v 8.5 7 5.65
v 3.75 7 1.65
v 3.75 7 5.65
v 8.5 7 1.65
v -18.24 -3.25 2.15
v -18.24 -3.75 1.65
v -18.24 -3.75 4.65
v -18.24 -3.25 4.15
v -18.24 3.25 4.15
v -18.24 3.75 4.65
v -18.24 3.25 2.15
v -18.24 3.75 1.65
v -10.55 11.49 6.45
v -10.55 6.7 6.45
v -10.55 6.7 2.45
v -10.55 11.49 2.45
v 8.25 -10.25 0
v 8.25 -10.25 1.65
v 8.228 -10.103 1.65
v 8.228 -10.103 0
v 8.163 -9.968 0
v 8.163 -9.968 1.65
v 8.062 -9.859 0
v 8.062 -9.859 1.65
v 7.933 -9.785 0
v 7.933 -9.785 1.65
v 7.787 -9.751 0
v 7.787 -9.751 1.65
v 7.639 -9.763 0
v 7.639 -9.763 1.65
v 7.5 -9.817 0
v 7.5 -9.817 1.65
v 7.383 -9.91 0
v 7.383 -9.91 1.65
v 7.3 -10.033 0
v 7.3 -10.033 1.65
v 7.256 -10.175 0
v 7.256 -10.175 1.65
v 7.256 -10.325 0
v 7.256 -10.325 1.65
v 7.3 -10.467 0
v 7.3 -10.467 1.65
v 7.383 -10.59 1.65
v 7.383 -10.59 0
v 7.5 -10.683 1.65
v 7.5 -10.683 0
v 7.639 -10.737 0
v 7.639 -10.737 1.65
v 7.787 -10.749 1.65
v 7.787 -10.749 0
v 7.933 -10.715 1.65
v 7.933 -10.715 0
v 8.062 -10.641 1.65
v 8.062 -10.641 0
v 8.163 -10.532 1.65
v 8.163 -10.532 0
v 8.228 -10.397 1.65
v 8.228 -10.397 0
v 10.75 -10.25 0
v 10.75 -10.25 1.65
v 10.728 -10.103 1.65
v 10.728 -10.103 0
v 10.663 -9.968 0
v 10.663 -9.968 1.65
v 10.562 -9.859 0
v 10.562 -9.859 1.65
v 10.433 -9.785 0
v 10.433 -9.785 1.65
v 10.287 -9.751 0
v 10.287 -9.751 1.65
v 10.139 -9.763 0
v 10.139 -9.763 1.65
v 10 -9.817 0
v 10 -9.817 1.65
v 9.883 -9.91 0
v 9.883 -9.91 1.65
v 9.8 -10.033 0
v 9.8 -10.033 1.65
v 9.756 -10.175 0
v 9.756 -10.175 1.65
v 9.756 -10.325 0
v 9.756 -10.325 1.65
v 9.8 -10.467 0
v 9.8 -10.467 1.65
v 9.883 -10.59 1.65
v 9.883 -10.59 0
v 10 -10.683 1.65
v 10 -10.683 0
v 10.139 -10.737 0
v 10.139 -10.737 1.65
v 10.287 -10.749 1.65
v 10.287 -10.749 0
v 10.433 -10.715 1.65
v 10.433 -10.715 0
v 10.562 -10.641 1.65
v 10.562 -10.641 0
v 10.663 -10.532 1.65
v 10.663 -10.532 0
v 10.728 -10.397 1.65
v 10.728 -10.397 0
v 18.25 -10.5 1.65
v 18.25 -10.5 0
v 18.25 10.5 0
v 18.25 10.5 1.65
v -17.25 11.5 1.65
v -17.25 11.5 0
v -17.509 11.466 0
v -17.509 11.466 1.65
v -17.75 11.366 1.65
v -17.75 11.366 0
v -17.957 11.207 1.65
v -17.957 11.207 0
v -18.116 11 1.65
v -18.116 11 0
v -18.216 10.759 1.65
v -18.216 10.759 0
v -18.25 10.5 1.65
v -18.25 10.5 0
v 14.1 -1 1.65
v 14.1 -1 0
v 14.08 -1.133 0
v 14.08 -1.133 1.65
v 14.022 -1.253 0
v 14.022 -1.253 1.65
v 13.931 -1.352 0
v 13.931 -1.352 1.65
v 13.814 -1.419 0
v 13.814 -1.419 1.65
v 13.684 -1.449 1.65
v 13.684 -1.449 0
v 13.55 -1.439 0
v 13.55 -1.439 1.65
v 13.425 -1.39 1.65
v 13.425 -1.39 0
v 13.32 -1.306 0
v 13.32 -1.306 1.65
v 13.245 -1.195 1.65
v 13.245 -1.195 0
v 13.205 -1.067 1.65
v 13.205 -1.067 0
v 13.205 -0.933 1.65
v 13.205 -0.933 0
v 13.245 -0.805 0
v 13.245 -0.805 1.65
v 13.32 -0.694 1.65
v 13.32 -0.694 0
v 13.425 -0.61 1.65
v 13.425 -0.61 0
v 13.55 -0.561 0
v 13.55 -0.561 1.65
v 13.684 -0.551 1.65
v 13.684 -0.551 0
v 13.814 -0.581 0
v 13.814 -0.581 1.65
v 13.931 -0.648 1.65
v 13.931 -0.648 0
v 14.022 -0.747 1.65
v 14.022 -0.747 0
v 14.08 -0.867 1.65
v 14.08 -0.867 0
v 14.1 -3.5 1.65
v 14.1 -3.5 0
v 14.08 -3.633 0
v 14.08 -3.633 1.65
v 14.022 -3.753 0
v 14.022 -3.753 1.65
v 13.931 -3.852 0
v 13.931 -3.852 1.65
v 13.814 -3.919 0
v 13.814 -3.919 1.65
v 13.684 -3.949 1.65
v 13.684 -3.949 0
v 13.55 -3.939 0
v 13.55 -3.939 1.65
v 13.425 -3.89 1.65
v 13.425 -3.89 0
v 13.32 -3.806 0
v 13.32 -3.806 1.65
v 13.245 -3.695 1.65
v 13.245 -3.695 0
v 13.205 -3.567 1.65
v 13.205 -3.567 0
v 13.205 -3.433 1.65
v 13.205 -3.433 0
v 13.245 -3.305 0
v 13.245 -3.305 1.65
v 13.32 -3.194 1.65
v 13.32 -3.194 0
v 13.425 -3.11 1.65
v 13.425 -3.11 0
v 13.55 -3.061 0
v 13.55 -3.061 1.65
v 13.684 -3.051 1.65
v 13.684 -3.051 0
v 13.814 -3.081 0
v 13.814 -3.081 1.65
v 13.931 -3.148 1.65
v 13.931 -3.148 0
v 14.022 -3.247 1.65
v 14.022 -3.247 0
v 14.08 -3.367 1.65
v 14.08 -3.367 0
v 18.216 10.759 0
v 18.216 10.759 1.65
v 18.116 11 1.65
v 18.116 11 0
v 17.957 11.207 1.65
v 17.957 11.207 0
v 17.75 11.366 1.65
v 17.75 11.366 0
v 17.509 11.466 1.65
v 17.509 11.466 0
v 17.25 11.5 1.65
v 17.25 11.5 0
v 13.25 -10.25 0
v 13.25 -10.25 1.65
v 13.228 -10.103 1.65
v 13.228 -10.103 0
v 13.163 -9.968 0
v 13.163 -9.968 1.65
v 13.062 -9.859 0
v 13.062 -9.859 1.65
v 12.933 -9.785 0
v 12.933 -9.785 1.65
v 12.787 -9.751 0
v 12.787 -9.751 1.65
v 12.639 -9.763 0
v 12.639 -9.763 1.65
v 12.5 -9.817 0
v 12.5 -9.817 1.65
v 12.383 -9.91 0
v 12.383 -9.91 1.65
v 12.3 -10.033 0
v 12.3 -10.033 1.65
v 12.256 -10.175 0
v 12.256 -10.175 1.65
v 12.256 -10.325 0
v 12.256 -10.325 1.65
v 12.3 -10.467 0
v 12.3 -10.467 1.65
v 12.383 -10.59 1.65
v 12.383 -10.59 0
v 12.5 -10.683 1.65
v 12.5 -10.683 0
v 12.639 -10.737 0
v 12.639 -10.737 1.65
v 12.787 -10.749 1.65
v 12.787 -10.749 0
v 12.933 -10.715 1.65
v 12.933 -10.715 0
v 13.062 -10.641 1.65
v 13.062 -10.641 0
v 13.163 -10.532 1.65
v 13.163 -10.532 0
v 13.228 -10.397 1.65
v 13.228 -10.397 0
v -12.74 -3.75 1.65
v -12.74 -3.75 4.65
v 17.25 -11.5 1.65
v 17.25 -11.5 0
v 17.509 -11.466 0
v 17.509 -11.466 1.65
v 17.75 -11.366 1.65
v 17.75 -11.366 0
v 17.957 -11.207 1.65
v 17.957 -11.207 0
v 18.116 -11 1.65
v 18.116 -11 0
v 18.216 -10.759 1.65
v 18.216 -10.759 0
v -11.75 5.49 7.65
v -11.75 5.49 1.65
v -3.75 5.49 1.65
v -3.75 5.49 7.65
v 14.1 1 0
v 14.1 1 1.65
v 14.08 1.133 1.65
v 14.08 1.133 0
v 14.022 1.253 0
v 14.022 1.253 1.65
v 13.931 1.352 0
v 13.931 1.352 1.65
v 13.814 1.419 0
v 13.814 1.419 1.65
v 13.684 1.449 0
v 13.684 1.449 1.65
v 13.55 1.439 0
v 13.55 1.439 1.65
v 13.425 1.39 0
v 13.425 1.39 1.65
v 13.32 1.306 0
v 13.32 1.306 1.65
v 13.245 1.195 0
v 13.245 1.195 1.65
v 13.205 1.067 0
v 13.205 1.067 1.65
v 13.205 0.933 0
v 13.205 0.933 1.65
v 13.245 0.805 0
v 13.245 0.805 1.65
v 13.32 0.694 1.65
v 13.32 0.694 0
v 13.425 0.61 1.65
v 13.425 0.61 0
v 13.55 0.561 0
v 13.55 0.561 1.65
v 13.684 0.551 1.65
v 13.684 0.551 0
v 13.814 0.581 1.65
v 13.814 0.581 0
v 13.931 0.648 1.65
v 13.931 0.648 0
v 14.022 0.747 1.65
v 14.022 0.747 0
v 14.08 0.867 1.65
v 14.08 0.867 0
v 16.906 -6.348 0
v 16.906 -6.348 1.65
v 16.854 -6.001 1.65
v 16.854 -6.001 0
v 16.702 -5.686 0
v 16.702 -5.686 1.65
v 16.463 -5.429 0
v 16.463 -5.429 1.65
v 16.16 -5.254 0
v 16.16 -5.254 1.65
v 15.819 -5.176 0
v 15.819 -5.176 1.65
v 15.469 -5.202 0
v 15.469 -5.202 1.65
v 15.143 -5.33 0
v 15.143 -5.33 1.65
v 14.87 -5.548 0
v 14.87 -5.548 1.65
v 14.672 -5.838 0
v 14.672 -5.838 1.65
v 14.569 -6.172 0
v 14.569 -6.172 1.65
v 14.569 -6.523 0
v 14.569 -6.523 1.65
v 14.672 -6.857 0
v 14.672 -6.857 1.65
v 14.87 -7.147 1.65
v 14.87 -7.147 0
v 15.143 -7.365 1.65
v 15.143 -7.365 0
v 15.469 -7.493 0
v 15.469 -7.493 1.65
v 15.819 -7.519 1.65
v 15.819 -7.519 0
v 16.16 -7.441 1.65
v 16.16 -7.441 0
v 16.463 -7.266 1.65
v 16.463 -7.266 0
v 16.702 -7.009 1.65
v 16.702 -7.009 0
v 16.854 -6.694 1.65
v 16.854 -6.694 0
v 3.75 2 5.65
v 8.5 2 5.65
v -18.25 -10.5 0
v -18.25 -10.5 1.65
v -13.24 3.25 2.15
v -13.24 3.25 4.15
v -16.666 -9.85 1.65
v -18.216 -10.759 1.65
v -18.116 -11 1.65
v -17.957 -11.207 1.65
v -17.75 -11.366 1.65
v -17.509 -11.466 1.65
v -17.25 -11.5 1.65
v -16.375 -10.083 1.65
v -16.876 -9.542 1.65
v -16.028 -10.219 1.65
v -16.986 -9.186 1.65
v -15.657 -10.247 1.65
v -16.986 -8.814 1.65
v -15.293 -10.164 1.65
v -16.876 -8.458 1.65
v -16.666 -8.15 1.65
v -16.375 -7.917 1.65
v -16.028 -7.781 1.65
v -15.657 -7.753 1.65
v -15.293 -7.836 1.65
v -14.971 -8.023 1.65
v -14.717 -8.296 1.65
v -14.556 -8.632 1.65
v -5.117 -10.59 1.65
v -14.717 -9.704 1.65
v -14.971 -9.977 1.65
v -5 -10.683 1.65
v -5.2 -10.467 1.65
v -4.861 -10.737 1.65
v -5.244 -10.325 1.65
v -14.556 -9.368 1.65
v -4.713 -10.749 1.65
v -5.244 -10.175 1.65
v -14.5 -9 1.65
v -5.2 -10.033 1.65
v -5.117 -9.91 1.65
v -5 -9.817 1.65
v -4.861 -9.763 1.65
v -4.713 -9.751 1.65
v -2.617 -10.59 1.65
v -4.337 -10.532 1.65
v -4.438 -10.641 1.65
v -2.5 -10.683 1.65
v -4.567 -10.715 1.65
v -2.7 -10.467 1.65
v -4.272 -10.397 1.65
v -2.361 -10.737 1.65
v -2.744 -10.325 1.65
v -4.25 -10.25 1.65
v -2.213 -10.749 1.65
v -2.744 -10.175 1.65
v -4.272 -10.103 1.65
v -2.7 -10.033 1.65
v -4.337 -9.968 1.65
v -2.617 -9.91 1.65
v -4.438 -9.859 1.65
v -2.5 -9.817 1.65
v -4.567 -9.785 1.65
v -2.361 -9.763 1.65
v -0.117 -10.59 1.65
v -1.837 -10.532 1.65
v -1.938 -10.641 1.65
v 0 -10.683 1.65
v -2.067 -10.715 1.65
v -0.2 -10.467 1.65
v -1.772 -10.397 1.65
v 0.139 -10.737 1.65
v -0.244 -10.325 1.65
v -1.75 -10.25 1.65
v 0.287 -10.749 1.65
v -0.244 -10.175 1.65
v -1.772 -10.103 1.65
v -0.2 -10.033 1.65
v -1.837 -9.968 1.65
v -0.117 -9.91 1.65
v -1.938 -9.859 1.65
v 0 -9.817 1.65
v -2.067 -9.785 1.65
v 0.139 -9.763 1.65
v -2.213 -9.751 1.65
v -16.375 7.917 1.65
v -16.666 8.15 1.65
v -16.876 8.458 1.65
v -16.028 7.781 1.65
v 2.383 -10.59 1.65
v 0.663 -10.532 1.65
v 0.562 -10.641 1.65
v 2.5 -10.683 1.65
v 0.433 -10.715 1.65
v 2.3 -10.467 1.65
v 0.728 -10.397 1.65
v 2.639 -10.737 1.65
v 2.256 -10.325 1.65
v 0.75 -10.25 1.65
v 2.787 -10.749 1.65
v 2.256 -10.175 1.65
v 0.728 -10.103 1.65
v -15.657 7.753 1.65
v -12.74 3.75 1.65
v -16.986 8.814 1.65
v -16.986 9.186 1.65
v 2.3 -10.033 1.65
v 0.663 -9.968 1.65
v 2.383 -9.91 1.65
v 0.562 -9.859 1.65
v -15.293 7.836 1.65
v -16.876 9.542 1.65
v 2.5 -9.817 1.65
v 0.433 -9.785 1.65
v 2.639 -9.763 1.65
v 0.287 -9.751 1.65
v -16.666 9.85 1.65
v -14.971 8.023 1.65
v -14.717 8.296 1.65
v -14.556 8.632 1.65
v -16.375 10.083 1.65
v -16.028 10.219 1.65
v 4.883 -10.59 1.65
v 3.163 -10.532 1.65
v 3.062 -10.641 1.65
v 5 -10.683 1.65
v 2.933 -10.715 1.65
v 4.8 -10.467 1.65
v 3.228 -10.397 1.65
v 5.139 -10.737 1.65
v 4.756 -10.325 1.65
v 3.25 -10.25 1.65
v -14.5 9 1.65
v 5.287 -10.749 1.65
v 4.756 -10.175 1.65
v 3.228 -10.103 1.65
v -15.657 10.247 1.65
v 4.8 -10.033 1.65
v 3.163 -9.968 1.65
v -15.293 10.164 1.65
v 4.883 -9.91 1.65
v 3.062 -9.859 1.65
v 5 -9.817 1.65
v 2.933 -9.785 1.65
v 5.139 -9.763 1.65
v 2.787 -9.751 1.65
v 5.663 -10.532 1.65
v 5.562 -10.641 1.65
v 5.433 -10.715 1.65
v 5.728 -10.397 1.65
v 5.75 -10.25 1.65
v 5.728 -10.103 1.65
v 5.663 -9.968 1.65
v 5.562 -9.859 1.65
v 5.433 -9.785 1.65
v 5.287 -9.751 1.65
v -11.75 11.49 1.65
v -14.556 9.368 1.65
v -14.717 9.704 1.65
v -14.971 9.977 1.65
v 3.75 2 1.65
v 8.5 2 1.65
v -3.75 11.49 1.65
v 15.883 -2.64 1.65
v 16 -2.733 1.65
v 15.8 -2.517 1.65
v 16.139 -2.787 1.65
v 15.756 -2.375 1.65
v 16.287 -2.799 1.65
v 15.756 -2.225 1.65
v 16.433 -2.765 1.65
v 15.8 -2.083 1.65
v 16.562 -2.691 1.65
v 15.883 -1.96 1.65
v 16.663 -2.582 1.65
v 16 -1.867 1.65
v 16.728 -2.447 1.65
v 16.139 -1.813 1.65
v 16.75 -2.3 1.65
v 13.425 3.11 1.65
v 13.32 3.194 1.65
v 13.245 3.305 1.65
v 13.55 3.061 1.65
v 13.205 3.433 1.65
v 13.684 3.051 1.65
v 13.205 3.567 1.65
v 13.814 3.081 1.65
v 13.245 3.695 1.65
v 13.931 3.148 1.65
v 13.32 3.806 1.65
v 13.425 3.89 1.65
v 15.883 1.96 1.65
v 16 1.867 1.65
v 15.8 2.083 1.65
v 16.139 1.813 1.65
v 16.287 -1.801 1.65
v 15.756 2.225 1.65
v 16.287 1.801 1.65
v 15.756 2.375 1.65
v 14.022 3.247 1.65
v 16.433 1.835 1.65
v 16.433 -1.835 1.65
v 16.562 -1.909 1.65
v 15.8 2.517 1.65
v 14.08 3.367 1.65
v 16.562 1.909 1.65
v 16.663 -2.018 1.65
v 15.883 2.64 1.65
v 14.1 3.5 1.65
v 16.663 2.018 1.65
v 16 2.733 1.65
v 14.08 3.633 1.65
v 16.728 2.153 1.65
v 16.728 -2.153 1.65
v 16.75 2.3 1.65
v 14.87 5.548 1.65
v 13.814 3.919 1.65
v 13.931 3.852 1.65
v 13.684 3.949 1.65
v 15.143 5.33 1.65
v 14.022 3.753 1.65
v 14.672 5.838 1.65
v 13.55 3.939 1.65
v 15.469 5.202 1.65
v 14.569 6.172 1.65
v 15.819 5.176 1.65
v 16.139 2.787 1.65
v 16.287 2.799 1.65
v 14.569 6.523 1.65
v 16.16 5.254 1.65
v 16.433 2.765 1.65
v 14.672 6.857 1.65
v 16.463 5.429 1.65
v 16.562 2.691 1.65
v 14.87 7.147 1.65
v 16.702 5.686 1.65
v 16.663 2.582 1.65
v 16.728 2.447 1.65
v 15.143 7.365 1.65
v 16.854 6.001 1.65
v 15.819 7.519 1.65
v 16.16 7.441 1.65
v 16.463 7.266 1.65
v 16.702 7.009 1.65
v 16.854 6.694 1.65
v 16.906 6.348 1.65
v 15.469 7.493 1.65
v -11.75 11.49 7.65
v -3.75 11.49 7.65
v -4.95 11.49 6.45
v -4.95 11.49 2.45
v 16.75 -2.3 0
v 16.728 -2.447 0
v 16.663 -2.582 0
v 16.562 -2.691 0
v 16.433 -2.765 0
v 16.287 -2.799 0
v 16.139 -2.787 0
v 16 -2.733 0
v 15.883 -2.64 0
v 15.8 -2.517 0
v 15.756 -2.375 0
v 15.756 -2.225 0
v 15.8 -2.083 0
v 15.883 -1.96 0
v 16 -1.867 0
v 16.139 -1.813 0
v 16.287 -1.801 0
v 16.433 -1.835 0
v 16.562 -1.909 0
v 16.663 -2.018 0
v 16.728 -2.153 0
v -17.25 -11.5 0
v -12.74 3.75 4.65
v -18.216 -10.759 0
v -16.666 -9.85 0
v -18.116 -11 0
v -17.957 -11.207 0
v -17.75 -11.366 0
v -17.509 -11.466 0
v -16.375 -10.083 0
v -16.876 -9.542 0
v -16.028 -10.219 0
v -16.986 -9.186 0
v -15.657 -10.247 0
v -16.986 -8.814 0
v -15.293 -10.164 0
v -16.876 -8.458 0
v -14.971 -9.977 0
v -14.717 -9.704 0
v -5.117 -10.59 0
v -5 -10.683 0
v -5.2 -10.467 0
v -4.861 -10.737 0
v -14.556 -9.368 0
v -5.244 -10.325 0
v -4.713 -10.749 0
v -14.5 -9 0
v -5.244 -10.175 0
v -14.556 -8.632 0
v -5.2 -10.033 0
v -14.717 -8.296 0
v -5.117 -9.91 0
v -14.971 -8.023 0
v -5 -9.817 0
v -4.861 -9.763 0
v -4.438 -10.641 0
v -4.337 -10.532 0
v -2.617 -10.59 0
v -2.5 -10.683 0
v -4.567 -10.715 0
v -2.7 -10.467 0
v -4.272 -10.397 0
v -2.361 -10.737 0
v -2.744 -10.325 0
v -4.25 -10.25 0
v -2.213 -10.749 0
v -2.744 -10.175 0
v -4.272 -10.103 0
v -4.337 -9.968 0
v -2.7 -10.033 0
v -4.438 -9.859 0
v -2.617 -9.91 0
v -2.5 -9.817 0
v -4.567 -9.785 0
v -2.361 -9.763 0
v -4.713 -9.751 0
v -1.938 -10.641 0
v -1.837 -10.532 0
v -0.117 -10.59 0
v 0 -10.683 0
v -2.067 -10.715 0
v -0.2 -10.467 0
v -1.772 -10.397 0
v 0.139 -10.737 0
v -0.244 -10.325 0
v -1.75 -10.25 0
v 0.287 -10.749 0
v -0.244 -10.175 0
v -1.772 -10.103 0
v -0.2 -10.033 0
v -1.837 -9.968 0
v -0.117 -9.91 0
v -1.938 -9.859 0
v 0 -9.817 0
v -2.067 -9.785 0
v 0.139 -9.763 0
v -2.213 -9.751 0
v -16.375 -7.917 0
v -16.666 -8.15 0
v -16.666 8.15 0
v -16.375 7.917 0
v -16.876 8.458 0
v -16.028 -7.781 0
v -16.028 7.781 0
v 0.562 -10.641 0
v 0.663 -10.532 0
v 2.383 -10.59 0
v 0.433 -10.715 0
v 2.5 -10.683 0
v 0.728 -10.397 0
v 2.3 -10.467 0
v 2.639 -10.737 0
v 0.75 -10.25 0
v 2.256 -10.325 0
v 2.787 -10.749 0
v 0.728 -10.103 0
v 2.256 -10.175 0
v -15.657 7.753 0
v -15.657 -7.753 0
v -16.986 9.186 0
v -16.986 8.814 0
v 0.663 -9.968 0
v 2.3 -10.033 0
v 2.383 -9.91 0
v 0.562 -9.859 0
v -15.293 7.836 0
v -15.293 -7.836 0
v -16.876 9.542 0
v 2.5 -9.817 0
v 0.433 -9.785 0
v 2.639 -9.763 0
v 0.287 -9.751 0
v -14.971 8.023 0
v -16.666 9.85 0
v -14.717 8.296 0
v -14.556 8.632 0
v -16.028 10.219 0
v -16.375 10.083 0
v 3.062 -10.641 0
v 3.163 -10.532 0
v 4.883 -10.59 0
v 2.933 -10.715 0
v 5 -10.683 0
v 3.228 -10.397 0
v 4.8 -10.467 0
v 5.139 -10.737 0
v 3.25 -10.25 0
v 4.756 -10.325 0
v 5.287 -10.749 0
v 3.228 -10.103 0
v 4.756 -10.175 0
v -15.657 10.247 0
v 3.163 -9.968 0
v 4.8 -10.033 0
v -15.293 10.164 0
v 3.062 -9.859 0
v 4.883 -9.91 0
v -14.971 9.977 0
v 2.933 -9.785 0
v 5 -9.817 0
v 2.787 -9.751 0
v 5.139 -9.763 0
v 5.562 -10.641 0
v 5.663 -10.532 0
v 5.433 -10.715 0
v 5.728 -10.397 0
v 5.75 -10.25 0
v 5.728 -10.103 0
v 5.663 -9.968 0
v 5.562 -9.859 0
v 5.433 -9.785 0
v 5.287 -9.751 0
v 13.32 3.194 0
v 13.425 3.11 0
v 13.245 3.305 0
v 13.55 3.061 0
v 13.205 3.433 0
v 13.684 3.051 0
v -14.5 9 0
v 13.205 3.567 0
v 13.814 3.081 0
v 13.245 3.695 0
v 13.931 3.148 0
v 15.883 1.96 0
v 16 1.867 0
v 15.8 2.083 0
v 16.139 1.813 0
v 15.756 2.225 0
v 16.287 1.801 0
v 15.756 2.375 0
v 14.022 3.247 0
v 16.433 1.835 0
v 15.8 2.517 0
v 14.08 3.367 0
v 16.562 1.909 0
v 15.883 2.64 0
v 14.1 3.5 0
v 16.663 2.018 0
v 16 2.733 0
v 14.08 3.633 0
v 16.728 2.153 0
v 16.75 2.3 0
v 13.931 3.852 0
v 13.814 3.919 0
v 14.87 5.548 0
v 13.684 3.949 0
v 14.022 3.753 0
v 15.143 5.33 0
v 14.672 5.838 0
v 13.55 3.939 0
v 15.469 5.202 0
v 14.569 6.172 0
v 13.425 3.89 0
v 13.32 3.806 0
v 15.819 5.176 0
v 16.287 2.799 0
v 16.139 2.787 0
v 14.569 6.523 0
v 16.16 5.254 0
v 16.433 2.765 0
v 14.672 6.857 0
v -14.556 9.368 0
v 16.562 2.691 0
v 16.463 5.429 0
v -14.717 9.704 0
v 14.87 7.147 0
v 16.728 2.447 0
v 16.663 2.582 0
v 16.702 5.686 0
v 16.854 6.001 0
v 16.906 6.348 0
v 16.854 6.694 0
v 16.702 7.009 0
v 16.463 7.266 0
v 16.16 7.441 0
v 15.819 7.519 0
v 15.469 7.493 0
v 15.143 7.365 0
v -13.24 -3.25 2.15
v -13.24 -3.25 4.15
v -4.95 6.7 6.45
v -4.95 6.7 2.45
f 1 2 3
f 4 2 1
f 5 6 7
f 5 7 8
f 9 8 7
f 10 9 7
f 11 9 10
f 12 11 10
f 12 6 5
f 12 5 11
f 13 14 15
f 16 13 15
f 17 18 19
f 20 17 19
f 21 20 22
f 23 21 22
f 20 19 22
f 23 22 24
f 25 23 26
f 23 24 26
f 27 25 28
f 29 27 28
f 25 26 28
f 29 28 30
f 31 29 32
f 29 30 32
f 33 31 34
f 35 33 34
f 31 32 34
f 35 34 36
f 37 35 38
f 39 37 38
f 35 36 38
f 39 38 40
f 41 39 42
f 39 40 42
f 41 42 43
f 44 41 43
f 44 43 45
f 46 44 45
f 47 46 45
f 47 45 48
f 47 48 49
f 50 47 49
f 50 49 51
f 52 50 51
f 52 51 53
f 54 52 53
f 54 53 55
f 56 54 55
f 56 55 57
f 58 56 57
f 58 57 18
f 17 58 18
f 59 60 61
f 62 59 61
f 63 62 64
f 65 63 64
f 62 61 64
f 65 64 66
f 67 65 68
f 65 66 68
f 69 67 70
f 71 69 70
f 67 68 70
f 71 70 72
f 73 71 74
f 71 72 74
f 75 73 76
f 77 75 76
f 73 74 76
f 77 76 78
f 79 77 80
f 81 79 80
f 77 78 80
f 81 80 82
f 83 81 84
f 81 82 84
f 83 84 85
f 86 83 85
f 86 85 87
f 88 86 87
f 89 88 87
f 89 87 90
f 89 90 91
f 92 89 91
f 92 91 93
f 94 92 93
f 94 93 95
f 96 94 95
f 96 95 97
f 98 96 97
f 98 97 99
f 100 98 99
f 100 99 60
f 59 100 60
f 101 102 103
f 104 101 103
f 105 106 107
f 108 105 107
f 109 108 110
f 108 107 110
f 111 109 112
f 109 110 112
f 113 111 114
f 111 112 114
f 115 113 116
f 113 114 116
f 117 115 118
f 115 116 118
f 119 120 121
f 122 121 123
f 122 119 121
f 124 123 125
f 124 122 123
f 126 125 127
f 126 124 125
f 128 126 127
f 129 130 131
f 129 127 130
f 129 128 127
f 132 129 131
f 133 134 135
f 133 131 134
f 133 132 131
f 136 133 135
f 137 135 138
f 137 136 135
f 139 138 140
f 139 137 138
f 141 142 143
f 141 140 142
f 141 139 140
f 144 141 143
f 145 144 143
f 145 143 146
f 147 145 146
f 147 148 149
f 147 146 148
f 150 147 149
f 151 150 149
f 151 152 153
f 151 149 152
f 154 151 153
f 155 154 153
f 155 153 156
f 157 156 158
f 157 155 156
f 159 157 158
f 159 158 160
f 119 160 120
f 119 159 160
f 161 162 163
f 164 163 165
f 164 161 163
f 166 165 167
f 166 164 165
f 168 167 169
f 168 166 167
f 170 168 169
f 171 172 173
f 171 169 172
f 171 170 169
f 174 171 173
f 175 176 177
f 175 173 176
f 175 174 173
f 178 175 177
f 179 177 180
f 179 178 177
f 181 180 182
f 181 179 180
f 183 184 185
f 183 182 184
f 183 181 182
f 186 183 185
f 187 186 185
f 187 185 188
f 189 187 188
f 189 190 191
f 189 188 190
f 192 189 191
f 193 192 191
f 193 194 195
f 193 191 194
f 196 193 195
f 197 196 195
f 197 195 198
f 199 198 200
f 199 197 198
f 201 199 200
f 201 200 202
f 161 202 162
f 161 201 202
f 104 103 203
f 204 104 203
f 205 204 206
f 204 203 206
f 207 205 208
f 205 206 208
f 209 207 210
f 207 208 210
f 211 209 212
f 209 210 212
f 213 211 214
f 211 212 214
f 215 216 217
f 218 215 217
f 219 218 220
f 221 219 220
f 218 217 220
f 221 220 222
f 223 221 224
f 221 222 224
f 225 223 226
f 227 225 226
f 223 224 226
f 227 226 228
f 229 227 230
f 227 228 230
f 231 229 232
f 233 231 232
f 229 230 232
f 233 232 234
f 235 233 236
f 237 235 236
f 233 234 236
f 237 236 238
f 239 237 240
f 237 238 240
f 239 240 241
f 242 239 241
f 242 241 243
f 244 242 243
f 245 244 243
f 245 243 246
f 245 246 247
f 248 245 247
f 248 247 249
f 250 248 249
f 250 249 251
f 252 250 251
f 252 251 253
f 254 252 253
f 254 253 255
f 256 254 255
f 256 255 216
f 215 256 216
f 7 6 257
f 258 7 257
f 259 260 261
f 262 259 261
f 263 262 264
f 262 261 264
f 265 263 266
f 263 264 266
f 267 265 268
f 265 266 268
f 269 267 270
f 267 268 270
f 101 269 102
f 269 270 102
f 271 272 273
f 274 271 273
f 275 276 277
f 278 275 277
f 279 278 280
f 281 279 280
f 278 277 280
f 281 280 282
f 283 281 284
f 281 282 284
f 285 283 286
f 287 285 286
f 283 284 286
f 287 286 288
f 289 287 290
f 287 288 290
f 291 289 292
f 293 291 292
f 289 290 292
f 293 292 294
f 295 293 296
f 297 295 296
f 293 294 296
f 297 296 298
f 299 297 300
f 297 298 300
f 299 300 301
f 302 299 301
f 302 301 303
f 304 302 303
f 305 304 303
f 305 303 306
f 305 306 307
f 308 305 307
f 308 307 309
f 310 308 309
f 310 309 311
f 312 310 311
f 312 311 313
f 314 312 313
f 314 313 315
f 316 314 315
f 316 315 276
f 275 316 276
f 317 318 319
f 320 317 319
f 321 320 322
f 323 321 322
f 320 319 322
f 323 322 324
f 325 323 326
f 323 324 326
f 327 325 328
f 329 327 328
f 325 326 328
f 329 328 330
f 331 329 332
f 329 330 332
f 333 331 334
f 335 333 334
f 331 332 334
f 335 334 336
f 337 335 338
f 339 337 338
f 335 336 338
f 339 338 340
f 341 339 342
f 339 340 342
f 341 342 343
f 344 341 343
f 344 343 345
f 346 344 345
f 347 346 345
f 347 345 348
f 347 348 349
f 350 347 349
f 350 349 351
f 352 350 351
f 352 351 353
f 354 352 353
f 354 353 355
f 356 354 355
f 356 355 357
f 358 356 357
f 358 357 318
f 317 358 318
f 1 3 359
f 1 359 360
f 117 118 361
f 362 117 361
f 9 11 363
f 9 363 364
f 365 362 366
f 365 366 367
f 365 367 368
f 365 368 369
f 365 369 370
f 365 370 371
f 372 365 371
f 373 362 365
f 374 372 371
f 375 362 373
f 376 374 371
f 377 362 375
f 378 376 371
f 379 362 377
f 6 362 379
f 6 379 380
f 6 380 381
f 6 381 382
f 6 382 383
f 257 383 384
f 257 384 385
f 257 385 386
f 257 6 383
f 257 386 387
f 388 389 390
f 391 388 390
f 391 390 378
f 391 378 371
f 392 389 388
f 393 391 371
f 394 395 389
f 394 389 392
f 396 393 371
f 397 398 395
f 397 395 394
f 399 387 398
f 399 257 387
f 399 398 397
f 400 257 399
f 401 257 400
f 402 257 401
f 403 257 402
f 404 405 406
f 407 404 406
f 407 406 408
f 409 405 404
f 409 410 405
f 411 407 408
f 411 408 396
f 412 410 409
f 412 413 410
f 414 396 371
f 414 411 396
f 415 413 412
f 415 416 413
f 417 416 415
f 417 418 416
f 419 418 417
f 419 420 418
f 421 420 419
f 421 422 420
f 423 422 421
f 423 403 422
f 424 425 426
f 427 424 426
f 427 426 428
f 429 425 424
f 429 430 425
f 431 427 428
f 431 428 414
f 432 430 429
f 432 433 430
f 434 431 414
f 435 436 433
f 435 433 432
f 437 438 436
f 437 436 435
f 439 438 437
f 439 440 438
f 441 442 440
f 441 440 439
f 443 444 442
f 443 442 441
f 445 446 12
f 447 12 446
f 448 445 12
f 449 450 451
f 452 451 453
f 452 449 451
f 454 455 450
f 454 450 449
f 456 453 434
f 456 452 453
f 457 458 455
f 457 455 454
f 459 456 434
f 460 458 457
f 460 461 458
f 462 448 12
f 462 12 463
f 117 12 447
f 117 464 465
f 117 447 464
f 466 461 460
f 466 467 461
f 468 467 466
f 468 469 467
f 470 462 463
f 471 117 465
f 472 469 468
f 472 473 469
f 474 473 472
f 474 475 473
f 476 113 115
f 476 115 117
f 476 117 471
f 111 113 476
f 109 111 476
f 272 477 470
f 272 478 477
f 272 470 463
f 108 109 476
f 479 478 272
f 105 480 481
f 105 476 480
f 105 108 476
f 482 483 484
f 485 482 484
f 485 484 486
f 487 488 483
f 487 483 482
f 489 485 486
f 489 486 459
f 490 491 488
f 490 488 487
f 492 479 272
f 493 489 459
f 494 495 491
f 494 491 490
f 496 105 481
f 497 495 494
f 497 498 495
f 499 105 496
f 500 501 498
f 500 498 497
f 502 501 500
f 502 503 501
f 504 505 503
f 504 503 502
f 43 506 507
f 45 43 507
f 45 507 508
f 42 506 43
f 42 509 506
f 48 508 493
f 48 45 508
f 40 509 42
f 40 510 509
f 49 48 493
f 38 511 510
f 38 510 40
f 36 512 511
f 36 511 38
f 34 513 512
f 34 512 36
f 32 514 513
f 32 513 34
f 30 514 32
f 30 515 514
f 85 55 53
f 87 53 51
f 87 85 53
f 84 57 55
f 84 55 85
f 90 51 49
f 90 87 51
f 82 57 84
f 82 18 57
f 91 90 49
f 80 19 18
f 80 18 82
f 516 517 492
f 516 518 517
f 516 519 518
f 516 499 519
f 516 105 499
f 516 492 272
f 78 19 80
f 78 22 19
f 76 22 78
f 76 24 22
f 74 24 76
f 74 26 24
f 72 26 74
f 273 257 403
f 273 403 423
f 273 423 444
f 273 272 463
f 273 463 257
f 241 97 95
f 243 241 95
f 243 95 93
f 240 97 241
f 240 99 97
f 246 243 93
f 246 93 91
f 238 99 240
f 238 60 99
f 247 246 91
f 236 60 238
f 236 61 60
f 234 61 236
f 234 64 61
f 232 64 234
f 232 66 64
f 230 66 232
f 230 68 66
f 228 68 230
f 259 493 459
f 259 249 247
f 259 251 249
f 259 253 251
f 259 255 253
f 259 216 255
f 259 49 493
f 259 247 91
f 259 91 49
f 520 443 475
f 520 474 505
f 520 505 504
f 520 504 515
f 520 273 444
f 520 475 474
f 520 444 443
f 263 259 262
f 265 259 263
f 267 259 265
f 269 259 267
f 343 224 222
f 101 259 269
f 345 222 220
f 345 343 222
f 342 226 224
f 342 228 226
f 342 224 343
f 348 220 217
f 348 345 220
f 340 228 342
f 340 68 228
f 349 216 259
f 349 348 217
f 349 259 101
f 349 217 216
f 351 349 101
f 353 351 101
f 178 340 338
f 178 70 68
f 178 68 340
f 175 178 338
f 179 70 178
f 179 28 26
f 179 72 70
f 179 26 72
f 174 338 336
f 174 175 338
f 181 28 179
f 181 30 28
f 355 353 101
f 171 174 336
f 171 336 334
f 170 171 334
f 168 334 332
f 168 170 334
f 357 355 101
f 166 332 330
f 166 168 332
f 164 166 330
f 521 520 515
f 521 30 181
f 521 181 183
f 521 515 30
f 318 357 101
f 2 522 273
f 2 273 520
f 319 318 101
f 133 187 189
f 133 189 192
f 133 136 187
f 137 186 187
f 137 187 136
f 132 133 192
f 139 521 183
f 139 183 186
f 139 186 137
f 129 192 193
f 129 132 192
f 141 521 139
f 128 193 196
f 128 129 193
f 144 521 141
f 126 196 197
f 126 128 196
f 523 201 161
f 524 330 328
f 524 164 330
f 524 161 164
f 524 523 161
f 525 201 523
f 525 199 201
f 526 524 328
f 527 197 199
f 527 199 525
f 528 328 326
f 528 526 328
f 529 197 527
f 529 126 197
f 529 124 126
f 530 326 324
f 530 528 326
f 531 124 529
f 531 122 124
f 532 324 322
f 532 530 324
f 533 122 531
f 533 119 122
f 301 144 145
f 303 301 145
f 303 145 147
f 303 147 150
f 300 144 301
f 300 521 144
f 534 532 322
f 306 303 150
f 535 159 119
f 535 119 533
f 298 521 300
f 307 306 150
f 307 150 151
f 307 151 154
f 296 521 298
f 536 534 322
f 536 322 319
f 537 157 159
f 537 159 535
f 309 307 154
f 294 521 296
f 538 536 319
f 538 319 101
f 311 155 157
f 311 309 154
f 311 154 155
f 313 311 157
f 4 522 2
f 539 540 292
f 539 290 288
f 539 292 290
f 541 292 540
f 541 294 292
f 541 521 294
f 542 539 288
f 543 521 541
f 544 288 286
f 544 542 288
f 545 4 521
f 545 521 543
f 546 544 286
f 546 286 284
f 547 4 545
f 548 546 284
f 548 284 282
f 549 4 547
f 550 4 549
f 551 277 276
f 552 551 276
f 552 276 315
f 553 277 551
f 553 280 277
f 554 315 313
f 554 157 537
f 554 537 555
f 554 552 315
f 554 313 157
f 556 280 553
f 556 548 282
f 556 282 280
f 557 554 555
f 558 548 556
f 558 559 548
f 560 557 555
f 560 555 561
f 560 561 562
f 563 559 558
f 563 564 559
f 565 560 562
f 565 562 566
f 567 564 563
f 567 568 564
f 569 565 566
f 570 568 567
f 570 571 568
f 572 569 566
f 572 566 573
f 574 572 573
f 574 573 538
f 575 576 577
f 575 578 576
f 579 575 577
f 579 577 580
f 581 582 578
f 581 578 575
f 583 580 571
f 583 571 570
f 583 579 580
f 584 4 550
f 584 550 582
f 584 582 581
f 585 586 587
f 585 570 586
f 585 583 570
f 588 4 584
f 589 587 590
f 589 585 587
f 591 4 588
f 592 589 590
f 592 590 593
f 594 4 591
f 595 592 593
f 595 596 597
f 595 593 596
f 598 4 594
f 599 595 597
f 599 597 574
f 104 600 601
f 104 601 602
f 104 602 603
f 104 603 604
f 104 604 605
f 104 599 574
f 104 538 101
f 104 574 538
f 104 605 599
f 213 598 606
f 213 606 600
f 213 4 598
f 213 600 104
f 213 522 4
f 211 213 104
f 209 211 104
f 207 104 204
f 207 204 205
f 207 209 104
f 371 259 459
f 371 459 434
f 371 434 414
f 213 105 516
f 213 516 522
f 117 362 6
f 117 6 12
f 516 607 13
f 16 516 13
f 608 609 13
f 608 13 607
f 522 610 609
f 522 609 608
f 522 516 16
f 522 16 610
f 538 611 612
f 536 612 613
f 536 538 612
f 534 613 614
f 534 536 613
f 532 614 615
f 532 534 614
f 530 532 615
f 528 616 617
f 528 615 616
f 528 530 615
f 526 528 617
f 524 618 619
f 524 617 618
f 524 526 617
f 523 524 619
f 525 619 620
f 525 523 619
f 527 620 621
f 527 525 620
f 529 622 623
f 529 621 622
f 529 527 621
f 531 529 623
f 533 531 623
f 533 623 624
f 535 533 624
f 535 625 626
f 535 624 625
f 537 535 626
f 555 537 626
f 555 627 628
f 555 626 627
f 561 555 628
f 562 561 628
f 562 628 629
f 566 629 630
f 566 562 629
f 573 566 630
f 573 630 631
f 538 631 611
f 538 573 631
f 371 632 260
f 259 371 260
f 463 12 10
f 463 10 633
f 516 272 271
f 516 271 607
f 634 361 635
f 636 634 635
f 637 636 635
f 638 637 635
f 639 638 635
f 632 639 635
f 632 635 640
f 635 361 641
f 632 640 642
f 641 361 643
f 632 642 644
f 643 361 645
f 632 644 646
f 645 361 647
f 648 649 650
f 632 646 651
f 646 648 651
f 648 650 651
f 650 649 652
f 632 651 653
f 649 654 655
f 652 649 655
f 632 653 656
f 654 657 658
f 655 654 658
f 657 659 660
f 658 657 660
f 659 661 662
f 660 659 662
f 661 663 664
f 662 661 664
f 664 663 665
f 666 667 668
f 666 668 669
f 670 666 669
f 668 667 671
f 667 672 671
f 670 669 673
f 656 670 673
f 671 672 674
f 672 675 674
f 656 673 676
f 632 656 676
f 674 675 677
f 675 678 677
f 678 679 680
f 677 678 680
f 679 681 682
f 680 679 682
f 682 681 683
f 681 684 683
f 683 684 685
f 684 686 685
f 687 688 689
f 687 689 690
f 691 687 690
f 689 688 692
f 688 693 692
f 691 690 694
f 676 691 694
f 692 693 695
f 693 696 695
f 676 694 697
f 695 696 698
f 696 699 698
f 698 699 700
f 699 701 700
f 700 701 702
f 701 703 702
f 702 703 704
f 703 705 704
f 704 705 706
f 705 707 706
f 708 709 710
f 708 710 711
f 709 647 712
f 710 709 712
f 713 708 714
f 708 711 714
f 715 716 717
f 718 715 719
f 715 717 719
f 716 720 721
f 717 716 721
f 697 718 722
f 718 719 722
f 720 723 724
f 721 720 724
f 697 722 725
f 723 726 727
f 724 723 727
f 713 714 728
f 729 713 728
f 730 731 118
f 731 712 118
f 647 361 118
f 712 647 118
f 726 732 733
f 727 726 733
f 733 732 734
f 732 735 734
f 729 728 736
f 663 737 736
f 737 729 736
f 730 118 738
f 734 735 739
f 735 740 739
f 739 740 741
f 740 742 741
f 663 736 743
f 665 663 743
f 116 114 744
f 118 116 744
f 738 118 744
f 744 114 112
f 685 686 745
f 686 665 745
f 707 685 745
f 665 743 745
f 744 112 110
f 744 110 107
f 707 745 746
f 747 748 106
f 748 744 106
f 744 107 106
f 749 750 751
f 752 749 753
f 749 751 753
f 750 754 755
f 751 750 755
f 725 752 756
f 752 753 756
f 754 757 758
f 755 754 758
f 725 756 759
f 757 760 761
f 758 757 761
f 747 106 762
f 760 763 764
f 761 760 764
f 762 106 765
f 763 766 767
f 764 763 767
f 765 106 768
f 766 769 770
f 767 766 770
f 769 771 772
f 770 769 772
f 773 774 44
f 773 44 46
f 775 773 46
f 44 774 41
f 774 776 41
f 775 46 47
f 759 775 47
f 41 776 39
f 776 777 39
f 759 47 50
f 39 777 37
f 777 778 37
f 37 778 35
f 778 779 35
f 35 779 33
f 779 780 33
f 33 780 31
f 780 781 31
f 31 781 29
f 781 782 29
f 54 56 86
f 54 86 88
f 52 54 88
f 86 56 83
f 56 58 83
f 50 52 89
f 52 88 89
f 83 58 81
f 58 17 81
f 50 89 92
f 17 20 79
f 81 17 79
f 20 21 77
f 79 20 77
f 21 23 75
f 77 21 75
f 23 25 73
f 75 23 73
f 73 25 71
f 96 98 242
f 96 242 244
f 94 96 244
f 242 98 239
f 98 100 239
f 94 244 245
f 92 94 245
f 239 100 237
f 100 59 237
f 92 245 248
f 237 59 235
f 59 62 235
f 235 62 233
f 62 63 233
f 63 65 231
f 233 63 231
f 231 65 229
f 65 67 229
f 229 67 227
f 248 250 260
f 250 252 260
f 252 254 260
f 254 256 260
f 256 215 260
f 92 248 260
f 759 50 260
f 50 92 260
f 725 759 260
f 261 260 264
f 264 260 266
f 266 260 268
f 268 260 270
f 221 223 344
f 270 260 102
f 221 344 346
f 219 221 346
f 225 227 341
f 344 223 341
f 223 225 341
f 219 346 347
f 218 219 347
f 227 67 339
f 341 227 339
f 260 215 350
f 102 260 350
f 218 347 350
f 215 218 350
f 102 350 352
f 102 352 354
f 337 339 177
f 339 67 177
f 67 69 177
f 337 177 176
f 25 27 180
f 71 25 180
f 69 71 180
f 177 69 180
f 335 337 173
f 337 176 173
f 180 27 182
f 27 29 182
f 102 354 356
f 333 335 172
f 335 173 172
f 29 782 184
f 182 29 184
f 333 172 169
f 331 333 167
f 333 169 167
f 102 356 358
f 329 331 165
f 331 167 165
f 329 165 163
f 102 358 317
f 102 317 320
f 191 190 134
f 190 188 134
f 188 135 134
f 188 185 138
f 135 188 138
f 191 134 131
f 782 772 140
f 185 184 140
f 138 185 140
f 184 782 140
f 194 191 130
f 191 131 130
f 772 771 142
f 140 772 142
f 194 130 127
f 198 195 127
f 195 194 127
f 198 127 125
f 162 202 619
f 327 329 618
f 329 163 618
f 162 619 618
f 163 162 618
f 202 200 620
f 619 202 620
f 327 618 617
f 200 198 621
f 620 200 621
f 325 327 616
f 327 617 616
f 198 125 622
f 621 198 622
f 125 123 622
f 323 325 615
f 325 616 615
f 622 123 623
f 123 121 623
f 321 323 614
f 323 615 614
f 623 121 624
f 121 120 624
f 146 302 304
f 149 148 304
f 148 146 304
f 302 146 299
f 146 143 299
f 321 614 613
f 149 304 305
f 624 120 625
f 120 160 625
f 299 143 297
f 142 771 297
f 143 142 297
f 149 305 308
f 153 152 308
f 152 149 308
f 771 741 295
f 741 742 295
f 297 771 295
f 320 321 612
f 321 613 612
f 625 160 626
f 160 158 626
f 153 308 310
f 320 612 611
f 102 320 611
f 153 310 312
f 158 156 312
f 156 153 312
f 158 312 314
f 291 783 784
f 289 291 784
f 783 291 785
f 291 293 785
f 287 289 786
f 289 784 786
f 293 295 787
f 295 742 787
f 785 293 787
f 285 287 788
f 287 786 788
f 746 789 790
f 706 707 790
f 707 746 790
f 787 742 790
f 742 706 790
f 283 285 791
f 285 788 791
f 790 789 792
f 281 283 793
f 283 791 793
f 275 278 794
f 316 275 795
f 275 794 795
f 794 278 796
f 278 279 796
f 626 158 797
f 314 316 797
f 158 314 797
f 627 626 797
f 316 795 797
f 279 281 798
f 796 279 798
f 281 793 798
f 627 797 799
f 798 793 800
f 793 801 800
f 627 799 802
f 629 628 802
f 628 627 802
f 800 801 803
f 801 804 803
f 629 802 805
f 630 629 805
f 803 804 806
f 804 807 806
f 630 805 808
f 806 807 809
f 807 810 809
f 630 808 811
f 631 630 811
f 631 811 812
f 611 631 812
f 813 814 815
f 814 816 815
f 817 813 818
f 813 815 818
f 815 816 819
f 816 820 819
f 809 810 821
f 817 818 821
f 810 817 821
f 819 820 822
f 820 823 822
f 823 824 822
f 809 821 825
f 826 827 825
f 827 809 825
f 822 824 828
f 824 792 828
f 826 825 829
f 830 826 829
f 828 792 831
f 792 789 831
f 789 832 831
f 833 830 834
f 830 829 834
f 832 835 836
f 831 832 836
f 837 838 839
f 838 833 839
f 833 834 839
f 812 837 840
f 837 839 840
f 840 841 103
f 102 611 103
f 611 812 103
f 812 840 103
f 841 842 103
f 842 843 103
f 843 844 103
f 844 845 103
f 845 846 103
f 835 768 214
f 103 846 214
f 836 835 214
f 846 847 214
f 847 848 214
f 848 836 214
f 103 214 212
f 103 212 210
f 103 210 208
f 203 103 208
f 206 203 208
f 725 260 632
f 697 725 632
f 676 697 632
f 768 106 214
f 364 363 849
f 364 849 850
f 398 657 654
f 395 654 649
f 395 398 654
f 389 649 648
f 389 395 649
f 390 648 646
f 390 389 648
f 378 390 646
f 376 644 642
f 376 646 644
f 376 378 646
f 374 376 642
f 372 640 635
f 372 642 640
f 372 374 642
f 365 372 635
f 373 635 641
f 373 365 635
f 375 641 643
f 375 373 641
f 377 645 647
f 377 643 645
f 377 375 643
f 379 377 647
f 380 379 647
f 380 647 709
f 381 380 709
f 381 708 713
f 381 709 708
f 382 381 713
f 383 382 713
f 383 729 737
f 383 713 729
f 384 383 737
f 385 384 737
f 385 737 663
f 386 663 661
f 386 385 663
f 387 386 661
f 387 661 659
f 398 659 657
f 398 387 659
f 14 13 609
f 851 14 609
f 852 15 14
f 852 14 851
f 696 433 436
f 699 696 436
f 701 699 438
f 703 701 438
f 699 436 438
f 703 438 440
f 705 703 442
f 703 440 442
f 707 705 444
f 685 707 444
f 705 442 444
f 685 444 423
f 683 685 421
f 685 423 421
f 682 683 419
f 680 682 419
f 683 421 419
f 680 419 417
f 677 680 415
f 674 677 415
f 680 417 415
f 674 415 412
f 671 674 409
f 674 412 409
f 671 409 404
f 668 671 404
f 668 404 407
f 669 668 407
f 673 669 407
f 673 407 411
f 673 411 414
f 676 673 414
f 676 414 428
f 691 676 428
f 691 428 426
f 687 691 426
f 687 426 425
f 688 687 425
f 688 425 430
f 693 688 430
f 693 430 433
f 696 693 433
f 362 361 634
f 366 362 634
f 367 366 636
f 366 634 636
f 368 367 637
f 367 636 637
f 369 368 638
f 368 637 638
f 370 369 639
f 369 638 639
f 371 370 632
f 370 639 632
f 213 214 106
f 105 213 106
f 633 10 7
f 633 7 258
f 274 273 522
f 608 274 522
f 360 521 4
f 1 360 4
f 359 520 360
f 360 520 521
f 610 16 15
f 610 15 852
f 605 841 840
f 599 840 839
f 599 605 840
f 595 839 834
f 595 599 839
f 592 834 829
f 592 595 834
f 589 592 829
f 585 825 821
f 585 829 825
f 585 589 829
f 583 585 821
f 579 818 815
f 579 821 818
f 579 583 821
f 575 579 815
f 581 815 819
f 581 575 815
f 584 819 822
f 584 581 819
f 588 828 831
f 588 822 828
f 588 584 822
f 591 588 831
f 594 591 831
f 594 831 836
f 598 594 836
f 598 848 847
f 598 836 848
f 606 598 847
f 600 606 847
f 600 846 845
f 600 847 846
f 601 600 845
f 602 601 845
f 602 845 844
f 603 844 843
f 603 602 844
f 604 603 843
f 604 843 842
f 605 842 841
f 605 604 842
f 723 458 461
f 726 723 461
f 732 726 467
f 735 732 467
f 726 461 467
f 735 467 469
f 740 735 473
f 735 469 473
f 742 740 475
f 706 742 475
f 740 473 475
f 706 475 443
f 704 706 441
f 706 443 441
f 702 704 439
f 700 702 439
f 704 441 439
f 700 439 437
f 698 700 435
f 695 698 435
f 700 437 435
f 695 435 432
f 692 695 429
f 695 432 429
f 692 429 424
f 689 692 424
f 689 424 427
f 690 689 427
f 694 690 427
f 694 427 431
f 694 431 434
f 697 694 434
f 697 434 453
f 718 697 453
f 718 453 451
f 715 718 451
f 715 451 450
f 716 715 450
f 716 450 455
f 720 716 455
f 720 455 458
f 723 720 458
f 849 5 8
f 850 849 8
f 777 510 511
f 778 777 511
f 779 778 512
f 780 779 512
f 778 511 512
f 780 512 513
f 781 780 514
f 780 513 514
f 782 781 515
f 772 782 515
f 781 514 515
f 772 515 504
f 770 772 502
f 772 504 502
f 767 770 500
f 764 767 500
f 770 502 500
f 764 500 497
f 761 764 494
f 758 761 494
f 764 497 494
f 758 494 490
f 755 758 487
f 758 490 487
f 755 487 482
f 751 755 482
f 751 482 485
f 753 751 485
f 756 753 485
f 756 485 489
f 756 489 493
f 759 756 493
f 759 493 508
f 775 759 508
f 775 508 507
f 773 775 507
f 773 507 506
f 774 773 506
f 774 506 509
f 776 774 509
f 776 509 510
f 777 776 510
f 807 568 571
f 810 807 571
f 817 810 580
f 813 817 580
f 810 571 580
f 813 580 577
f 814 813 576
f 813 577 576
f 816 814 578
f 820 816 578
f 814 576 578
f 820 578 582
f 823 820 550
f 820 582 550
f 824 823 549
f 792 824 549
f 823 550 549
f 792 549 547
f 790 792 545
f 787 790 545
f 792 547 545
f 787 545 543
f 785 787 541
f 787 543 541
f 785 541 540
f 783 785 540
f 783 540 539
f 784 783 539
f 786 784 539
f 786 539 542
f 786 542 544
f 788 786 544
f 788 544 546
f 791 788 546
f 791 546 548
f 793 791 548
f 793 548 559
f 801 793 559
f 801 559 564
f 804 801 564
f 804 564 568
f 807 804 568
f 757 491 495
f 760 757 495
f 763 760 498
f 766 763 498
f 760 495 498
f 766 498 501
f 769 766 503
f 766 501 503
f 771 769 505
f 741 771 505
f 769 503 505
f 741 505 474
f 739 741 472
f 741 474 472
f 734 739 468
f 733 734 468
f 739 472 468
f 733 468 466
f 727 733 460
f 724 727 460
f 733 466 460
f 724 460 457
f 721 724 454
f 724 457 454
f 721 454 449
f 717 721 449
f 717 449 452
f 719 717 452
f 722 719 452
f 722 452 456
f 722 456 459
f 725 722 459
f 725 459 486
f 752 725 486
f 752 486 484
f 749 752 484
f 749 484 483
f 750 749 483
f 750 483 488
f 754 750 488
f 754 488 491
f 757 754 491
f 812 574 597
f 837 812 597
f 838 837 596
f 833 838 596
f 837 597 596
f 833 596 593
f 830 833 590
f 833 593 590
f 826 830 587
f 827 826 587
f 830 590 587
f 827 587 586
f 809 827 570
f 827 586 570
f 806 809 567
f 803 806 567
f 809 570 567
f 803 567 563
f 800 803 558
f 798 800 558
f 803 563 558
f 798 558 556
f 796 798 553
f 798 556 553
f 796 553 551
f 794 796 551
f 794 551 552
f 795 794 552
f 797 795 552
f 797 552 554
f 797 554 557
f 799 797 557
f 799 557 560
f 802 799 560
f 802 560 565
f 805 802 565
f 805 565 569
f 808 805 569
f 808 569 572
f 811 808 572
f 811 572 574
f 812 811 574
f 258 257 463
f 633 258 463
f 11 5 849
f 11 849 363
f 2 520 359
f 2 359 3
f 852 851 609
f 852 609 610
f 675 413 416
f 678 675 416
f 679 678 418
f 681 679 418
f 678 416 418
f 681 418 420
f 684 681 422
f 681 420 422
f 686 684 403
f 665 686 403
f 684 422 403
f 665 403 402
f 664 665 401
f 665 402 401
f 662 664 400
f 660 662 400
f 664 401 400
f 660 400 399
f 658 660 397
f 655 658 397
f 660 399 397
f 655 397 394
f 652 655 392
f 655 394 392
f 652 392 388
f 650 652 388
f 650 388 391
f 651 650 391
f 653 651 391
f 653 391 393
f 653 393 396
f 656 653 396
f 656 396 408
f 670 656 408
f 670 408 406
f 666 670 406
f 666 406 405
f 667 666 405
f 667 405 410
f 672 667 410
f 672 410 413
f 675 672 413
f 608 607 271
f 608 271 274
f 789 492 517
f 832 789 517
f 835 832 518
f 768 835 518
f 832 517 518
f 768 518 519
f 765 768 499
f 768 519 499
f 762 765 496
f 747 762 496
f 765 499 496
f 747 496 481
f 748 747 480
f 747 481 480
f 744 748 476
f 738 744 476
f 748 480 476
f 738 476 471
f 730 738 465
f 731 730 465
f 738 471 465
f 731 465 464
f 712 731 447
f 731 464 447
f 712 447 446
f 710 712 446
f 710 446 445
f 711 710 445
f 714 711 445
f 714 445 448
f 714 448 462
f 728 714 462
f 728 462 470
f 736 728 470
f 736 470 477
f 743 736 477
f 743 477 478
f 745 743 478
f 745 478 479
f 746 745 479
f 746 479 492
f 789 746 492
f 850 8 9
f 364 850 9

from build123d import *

# Parameters (mm, degrees)
BASE_DEPTH          = 1.65
SKETCH2_R           = 1.25
CUT_EXTRUDE1_DEPTH  = 22.634116575
SKETCH3_R           = 0.5
CUT_EXTRUDE2_DEPTH  = 22.634116575
LPATTERN1_COUNT     = 8
LPATTERN1_PITCH     = 2.5
SKETCH4_R           = 1.175
CUT_EXTRUDE3_DEPTH  = 22.634116575
SKETCH9_R           = 0.45
CUT_EXTRUDE6_DEPTH  = 22.634116575
SKETCH10_R          = 0.5
CUT_EXTRUDE7_DEPTH  = 22.634116575
SKETCH5_W           = 8
SKETCH5_H           = 6
BOSS_EXTRUDE2_DEPTH = 6
SKETCH6_W           = 5.6
SKETCH6_H           = 4
CUT_EXTRUDE4_DEPTH  = 4.8
SKETCH7_W           = 5.5
SKETCH7_H           = 7.5
BOSS_EXTRUDE3_DEPTH = 3
SKETCH8_W           = 2
SKETCH8_H           = 6.5
CUT_EXTRUDE5_DEPTH  = 5
SKETCH11_W          = 4.75
SKETCH11_H          = 5
BOSS_EXTRUDE4_DEPTH = 4


with BuildPart() as part:
    # Sketch1 → Base (new body)
    with BuildSketch(Plane.XY):
        with BuildLine():
            Line((-17.25, -11.5), (17.25, -11.5))
            ThreePointArc((17.25, -11.5), (17.957106781, -11.207106781), (18.25, -10.5))
            Line((18.25, -10.5), (18.25, 10.5))
            ThreePointArc((18.25, 10.5), (17.957106781, 11.207106781), (17.25, 11.5))
            Line((17.25, 11.5), (-17.25, 11.5))
            ThreePointArc((-17.25, 11.5), (-17.957106781, 11.207106781), (-18.25, 10.5))
            Line((-18.25, 10.5), (-18.25, -10.5))
            ThreePointArc((-18.25, -10.5), (-17.957106781, -11.207106781), (-17.25, -11.5))
        make_face()
    extrude(amount=BASE_DEPTH)

    # Sketch2 → Cut-Extrude1 (cut, through all)
    with BuildSketch(Plane.XY.offset(1.65)):
        with Locations((-15.75, 9)):
            Circle(SKETCH2_R)
    cut_extrude1 = extrude(amount=-CUT_EXTRUDE1_DEPTH, mode=Mode.SUBTRACT)

    # Mirror1: Cut-Extrude1 across plane
    add(cut_extrude1.mirror(Plane.ZX), mode=Mode.SUBTRACT)

    # Sketch3 → Cut-Extrude2 (cut, through all)
    with BuildSketch(Plane.XY.offset(1.65)):
        with Locations((12.75, -10.25)):
            Circle(SKETCH3_R)
    cut_extrude2 = extrude(amount=-CUT_EXTRUDE2_DEPTH, mode=Mode.SUBTRACT)

    # LPattern1: Cut-Extrude2 ×8
    with Locations(*[(-i * LPATTERN1_PITCH, 0, 0) for i in range(1, LPATTERN1_COUNT)]):
        add(cut_extrude2, mode=Mode.SUBTRACT)

    # Sketch4 → Cut-Extrude3 (cut, through all)
    with BuildSketch(Plane.XY.offset(1.65)):
        with Locations((15.730877355, -6.3475)):
            Circle(SKETCH4_R)
    cut_extrude3 = extrude(amount=-CUT_EXTRUDE3_DEPTH, mode=Mode.SUBTRACT)

    # Sketch9 → Cut-Extrude6 (cut, through all)
    with BuildSketch(Plane.XY.offset(1.65)):
        with Locations((13.65, 1)):
            Circle(SKETCH9_R)
        with Locations((13.65, 3.5)):
            Circle(SKETCH9_R)
    cut_extrude6 = extrude(amount=-CUT_EXTRUDE6_DEPTH, mode=Mode.SUBTRACT)

    # Sketch10 → Cut-Extrude7 (cut, through all)
    with BuildSketch(Plane.XY.offset(1.65)):
        with Locations((16.25, 2.3)):
            Circle(SKETCH10_R)
    cut_extrude7 = extrude(amount=-CUT_EXTRUDE7_DEPTH, mode=Mode.SUBTRACT)

    # Mirror2: Cut-Extrude3 across plane
    add(cut_extrude3.mirror(Plane.ZX), mode=Mode.SUBTRACT)

    # Mirror3: Cut-Extrude6 across plane
    add(cut_extrude6.mirror(Plane.ZX), mode=Mode.SUBTRACT)

    # Mirror4: Cut-Extrude7 across plane
    add(cut_extrude7.mirror(Plane.ZX), mode=Mode.SUBTRACT)

    # Sketch5 → Boss-Extrude2 (add)
    with BuildSketch(Plane.XY.offset(1.65)):
        with Locations((-7.75, 8.49)):
            Rectangle(SKETCH5_W, SKETCH5_H)
    extrude(amount=BOSS_EXTRUDE2_DEPTH)

    # Sketch6 → Cut-Extrude4 (cut)
    with BuildSketch(Plane(origin=(0, 11.5, 0), x_dir=(1, 0, 0), z_dir=(0, 1, 0))):
        with Locations((-7.75, -4.45)):
            Rectangle(SKETCH6_W, SKETCH6_H)
    extrude(amount=-CUT_EXTRUDE4_DEPTH, mode=Mode.SUBTRACT)

    # Sketch7 → Boss-Extrude3 (add)
    with BuildSketch(Plane.XY.offset(1.65)):
        with Locations((-15.49, 0)):
            Rectangle(SKETCH7_W, SKETCH7_H)
    extrude(amount=BOSS_EXTRUDE3_DEPTH)

    # Sketch8 → Cut-Extrude5 (cut)
    with BuildSketch(Plane.ZY.offset(18.24)):
        with Locations((3.15, 0)):
            Rectangle(SKETCH8_W, SKETCH8_H)
    extrude(amount=-CUT_EXTRUDE5_DEPTH, mode=Mode.SUBTRACT)

    # Sketch11 → Boss-Extrude4 (add)
    with BuildSketch(Plane.XY.offset(1.65)):
        with Locations((6.125, 4.5)):
            Rectangle(SKETCH11_W, SKETCH11_H)
    extrude(amount=BOSS_EXTRUDE4_DEPTH)


solid = part.part
